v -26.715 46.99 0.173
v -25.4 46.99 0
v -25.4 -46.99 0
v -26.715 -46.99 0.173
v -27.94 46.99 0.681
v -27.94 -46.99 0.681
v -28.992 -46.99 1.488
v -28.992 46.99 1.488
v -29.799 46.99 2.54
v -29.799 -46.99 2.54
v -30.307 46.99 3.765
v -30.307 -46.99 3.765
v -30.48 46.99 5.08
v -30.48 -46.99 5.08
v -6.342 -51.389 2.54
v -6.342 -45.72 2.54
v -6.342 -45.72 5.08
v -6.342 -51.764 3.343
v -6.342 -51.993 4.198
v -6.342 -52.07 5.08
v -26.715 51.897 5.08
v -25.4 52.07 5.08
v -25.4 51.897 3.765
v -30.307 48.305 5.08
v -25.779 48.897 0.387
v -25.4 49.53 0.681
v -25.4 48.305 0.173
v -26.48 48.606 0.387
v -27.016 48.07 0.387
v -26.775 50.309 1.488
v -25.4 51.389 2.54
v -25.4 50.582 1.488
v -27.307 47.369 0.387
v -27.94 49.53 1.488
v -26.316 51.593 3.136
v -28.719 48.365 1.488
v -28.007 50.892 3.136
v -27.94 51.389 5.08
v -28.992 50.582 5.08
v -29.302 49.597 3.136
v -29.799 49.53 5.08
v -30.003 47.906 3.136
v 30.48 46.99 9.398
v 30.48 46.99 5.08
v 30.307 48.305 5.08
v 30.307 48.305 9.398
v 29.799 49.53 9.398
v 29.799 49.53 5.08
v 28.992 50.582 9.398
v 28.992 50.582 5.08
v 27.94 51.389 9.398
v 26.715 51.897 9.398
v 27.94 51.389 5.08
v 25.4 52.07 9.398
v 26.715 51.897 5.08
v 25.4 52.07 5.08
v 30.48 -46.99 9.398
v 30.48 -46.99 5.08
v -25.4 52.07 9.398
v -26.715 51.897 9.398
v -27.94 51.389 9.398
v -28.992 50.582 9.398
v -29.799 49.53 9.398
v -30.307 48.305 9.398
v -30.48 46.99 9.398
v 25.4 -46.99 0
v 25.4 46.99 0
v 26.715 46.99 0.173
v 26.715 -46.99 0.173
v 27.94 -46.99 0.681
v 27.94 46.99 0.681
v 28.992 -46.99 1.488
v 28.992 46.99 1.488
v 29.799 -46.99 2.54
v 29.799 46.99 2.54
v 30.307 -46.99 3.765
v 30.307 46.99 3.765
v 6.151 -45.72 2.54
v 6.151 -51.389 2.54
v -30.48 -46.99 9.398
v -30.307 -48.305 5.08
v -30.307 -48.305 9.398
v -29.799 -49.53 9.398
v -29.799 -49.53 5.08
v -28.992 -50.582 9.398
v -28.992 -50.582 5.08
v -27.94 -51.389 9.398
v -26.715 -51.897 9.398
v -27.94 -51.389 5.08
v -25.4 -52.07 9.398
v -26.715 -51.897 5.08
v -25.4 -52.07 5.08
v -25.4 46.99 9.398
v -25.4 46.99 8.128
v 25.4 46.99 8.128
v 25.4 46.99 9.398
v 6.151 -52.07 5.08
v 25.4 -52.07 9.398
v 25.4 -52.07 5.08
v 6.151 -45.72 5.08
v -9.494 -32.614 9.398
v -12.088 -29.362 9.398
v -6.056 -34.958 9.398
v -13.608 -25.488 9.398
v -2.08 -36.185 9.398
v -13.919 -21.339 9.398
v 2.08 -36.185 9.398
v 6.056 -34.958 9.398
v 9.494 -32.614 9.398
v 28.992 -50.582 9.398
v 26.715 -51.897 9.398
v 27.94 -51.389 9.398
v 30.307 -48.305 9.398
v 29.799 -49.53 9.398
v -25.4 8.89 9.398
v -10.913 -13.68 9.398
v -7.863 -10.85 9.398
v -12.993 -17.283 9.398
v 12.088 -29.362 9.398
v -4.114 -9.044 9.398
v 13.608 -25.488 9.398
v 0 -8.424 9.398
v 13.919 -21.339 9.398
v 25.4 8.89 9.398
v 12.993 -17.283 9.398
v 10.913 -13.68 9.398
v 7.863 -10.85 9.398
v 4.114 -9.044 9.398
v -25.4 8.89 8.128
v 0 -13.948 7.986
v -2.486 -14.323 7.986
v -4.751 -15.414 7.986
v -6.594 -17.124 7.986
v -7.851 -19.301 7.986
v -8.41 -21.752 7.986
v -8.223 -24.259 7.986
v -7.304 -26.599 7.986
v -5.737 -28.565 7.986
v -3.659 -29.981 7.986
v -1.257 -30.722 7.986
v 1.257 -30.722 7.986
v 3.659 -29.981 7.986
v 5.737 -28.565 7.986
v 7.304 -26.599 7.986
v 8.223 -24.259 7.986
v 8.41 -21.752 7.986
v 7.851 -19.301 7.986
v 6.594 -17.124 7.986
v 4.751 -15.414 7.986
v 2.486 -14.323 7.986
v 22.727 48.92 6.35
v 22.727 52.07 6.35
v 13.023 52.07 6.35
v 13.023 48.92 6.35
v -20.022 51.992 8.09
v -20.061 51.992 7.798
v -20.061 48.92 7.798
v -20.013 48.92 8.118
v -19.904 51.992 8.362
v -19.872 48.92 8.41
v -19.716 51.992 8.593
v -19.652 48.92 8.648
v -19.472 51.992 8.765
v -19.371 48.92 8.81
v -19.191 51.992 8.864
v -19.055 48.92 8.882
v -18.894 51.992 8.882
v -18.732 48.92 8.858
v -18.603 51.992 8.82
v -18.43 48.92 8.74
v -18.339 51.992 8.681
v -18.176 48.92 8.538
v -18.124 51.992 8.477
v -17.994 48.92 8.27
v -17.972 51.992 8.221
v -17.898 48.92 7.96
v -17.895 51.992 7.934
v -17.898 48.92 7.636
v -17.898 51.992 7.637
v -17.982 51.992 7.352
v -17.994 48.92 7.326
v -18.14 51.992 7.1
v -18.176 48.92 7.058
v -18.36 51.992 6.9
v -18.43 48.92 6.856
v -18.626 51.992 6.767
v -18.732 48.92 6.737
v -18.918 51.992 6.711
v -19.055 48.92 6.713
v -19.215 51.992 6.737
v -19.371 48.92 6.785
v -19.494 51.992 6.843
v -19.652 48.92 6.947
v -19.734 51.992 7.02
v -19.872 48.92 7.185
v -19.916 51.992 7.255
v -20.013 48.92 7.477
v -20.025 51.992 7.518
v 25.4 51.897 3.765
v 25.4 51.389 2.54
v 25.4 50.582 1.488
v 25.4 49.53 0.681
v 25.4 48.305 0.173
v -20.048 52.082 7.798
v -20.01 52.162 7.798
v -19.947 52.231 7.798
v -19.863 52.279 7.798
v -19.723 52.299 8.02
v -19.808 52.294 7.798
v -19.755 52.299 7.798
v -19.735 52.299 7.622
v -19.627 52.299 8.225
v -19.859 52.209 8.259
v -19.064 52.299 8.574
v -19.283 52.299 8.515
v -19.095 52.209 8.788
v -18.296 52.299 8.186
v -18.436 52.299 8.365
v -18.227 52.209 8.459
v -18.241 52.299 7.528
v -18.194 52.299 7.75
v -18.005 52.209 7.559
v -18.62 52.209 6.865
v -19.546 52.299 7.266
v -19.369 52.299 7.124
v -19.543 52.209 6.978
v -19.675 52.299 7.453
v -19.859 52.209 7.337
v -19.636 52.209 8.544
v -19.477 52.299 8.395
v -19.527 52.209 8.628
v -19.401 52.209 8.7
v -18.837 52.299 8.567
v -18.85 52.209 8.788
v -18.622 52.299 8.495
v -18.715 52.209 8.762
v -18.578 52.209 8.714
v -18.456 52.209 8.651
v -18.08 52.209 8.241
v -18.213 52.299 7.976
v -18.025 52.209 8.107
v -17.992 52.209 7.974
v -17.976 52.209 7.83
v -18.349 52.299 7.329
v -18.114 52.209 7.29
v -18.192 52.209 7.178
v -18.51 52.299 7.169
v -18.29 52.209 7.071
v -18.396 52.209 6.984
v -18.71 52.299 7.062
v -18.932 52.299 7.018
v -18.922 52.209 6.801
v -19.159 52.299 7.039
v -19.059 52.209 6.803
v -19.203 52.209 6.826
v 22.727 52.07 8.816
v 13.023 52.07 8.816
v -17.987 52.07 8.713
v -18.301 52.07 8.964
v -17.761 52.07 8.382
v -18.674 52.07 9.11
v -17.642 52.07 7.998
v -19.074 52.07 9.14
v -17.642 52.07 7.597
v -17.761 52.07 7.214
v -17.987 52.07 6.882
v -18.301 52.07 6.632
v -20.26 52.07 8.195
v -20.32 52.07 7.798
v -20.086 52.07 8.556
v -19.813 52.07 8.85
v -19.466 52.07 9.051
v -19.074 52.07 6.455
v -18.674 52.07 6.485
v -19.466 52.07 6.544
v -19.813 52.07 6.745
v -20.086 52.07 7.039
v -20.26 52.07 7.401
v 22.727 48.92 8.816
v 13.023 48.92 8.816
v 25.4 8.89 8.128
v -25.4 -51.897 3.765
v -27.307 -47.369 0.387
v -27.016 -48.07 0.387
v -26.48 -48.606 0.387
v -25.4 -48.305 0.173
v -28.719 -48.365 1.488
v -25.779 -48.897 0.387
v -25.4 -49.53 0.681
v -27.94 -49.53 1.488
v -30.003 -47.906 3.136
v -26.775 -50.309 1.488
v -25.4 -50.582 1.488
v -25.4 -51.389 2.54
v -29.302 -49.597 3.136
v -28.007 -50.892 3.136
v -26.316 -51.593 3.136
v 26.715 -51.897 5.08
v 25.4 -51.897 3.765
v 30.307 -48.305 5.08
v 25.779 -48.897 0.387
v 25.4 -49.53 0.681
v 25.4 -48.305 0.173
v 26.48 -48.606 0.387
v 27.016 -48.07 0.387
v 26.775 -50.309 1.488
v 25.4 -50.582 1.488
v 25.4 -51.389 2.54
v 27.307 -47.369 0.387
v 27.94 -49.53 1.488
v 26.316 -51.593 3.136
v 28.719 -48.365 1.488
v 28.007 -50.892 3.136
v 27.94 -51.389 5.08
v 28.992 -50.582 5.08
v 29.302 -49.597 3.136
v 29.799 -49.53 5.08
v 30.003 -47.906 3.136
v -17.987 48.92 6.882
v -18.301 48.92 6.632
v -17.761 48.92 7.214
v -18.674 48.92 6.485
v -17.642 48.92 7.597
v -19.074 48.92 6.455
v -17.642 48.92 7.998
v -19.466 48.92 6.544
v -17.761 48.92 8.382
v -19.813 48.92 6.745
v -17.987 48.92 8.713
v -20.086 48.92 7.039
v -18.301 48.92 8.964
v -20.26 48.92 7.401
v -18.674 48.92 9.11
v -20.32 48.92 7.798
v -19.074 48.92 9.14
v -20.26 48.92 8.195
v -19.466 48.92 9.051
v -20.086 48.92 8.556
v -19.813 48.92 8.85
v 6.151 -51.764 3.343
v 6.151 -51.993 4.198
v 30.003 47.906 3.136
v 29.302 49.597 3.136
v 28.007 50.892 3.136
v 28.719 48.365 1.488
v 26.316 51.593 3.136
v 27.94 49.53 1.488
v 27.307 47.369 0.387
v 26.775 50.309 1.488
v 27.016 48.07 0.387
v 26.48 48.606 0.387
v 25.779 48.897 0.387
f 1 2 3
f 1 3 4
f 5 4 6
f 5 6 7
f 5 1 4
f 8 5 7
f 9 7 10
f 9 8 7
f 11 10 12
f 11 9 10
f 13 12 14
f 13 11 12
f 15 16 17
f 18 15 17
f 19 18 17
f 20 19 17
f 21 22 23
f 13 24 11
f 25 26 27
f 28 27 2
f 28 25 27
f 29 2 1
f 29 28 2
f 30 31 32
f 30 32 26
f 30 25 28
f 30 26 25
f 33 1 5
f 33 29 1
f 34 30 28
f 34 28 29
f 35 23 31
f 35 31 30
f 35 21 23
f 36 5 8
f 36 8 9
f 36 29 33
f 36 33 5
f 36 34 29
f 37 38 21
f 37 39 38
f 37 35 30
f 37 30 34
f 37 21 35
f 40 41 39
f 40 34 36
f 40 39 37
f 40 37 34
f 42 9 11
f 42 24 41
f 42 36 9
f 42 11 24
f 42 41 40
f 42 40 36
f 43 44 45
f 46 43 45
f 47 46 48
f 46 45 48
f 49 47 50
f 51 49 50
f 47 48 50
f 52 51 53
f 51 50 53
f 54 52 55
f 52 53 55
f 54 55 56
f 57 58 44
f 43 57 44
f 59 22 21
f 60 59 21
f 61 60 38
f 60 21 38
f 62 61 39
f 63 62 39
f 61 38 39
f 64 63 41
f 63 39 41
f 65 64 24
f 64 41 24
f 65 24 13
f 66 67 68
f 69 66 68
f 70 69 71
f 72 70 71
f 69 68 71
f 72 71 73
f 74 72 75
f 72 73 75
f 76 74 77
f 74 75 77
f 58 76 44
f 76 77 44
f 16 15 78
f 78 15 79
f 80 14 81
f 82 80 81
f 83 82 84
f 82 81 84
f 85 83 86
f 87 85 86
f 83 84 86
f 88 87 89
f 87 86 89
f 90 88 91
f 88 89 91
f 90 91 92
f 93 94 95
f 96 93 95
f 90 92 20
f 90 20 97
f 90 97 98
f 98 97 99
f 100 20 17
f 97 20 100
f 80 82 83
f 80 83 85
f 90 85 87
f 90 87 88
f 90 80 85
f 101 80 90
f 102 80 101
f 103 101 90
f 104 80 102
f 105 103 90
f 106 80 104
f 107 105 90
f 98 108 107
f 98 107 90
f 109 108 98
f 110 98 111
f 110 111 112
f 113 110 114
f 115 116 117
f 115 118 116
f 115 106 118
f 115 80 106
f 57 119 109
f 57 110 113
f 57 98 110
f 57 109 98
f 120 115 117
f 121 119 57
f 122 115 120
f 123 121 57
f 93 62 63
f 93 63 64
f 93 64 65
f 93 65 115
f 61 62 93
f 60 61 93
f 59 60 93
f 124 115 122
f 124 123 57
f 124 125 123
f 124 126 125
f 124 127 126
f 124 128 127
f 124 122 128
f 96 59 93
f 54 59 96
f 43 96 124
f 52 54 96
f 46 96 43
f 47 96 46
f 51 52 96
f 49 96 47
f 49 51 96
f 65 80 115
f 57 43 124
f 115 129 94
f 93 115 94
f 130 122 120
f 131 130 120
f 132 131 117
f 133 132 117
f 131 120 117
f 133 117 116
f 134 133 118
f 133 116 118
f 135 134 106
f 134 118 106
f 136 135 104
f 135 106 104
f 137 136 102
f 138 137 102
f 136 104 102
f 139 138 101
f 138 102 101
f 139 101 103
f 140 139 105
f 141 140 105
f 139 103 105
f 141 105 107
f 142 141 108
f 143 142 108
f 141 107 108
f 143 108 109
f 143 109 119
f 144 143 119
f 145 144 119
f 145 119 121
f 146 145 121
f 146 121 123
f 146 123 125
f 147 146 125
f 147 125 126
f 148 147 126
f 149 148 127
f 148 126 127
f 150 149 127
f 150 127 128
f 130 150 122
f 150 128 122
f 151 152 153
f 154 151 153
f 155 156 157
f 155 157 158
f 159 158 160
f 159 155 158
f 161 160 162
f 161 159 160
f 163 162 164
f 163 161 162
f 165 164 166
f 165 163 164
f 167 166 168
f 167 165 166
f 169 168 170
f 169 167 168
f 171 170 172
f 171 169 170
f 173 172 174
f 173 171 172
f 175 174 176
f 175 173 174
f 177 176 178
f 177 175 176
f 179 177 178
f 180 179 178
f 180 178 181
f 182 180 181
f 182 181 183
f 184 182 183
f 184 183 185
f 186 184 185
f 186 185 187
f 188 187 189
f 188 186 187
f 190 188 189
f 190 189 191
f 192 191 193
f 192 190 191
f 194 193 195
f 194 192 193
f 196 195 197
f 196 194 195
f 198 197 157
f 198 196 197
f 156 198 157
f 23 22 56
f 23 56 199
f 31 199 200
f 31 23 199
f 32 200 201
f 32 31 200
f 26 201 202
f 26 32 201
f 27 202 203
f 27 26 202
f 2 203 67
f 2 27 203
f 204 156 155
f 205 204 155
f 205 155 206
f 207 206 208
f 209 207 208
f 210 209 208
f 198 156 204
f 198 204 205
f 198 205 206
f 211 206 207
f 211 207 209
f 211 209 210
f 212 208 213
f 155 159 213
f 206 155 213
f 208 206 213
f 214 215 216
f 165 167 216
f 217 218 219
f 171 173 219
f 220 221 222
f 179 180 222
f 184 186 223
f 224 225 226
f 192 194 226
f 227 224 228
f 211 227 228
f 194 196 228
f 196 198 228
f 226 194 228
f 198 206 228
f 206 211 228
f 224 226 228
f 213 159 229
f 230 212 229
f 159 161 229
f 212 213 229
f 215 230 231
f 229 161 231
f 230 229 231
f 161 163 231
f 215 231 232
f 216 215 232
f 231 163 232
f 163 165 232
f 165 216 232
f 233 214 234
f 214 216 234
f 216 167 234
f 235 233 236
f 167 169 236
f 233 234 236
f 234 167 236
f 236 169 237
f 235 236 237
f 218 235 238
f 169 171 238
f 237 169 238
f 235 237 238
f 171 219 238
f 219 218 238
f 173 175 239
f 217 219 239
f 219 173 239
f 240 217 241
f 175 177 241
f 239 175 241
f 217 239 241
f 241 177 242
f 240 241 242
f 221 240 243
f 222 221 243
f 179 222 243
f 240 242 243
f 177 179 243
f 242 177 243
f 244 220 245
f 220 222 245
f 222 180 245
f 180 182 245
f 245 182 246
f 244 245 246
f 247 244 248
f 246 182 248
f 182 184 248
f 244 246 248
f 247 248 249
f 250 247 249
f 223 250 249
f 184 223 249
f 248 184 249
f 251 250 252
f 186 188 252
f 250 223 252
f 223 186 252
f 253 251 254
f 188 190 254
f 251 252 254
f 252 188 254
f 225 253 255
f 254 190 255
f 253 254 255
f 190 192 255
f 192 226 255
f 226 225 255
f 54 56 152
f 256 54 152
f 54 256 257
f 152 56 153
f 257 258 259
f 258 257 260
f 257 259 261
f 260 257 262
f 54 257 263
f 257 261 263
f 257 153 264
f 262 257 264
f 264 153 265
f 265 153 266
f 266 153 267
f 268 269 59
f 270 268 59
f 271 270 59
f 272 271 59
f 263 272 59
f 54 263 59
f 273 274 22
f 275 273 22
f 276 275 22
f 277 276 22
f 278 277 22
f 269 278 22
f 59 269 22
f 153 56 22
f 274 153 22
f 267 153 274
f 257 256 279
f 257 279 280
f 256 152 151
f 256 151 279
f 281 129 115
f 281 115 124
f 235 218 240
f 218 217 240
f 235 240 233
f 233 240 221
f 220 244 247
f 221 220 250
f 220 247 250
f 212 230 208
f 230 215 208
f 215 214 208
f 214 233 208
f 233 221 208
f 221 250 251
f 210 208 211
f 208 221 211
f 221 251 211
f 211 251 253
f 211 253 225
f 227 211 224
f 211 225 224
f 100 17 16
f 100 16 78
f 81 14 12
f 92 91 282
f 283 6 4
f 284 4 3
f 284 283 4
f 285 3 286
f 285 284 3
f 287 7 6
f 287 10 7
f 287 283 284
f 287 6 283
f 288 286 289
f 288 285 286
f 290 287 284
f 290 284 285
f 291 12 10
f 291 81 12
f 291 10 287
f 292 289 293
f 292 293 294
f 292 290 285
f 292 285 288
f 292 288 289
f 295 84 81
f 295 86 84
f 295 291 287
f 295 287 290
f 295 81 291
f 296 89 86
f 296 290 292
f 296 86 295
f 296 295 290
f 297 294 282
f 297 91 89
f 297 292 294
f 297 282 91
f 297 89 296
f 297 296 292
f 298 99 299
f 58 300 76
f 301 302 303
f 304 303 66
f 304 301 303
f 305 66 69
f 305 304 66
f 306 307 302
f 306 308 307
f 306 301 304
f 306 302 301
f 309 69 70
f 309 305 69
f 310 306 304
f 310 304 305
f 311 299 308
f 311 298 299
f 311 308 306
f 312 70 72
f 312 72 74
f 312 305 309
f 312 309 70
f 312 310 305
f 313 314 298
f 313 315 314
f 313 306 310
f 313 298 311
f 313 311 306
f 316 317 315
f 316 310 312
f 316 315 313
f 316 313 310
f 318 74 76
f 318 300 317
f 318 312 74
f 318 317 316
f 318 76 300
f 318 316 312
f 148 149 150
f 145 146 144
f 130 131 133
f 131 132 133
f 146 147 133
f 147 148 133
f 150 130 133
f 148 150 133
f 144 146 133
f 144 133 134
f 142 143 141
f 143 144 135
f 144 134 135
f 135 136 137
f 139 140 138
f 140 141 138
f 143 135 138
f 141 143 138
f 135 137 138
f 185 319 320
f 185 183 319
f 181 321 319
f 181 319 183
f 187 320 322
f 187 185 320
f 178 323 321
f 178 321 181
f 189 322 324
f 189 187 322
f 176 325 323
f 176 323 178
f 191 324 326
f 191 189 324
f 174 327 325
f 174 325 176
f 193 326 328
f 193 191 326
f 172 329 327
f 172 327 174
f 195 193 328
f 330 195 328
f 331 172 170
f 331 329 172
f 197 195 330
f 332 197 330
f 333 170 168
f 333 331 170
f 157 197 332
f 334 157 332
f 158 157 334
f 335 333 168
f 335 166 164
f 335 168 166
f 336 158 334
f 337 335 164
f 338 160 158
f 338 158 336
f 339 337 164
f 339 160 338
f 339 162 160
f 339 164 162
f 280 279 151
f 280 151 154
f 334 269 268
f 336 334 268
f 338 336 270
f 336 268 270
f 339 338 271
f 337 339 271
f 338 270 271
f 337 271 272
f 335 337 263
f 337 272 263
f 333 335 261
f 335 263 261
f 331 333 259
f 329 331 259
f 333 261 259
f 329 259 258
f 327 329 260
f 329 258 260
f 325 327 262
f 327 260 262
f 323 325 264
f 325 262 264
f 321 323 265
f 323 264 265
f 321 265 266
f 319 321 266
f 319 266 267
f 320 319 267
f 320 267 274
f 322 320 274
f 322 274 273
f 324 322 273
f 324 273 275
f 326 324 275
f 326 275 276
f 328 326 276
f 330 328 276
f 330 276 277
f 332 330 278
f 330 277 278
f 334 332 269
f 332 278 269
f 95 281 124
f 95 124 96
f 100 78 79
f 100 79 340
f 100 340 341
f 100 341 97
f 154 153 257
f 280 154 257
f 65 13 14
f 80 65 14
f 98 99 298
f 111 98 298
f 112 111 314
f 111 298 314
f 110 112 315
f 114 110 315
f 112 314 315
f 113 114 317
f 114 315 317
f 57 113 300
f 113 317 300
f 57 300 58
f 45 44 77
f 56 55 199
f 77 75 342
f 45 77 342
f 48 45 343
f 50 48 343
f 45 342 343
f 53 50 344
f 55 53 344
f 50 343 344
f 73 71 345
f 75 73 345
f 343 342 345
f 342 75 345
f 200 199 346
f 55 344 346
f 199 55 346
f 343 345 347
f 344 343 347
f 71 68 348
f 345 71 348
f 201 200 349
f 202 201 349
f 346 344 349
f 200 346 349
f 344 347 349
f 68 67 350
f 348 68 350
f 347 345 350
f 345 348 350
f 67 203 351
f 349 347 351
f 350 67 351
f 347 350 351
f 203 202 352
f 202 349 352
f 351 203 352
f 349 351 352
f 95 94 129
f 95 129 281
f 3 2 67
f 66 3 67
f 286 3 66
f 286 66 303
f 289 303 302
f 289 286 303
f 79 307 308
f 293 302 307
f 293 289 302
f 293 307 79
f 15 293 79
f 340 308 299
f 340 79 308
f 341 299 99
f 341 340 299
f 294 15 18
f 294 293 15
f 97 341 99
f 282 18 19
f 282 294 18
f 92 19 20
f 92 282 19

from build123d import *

# Parameters (mm, degrees)
F0_R         = 17.78
F0_W         = 50.8
F0_H         = 38.1
F0_R_2       = 7.62
F1_DEPTH     = 9.398
F2_W         = 12.4930366991
F2_H         = 2.54
F3_DEPTH     = 6.35
F4_W         = 9.7033483908
F4_H         = 2.4660443887
F4_R         = 1.3462908927
F4_R_2       = 1.087736237
F5_DEPTH     = 3.1496
F6_DEPTH     = 0.2286
F7_R         = 0.3066051224
F8_T1_DEPTH  = 93.98
F8_T3_DEPTH  = 50.8
F8_T6_ANGLE  = 90
F8_T8_ANGLE  = 90
F8_T10_ANGLE = 90
F8_T12_ANGLE = 90
F9_START     = 8.128
F9_DEPTH     = 1.524


# Not quite as in the source:
# - a fillet or chamfer that OpenCascade refuses, or shapes differently, is made with other operations: its cross-section is extruded or revolved along the edge and cut away or added


with BuildPart() as f1:
    # F0 (on Top) → F1 (new body)
    with BuildSketch(Plane.XY):
        with BuildLine():
            Line((25.4, 52.07), (-25.4, 52.07))
            ThreePointArc((-25.4, 52.07), (-28.9921024484, 50.5821024484), (-30.48, 46.99))
            Line((-30.48, 46.99), (-30.48, -46.99))
            ThreePointArc((-30.48, -46.99), (-28.9921024484, -50.5821024484), (-25.4, -52.07))
            Line((-25.4, -52.07), (25.4, -52.07))
            ThreePointArc((25.4, -52.07), (28.9921024484, -50.5821024484), (30.48, -46.99))
            Line((30.48, -46.99), (30.48, 46.99))
            ThreePointArc((30.48, 46.99), (28.9921024484, 50.5821024484), (25.4, 52.07))
        make_face()
        with Locations((0, -21.59)):
            Circle(F0_R, mode=Mode.SUBTRACT)
        with Locations((0, 27.94)):
            Rectangle(F0_W, F0_H, mode=Mode.SUBTRACT)
        with Locations((0, -21.59)):
            Circle(F0_R)
        with Locations((0, -21.59)):
            Circle(F0_R_2, mode=Mode.SUBTRACT)
        with Locations((0, -21.59)):
            Circle(F0_R_2)
        with Locations((0, 27.94)):
            Rectangle(F0_W, F0_H)
    extrude(amount=F1_DEPTH)

    # F2 (on face) → F3 (cut)
    with BuildSketch(Plane.XZ.offset(52.07)):
        with Locations((-0.0956295989, 3.81)):
            Rectangle(F2_W, F2_H)
    extrude(amount=-F3_DEPTH, mode=Mode.SUBTRACT)

    # F4 (on face) → F5 (cut)
    with BuildSketch(Plane(origin=(0, 52.07, 0), x_dir=(-1, 0, 0), z_dir=(0, 1, 0))):
        with Locations((-17.8750143386, 7.5830221944)):
            Rectangle(F4_W, F4_H)
        with Locations((18.9737091073, 7.7977091073)):
            Circle(F4_R)
        with Locations((18.9737091073, 7.7977091073)):
            Circle(F4_R_2, mode=Mode.SUBTRACT)
    extrude(amount=-F5_DEPTH, mode=Mode.SUBTRACT)

    # F6 (add): a face of the model
    f6_faces = [f1.faces().sort_by_distance(p)[0] for p in [
        (-18.9737091073, 52.07, 7.7977091073),
    ]]
    extrude(f6_faces, amount=F6_DEPTH)

    # F7
    f7_edges = [f1.edges().sort_by_distance(p)[0] for p in [
        (-17.885973, 52.2986, 7.797709),
    ]]
    fillet(f7_edges, radius=F7_R)

    # F8: fillet of radius 5.08 on 1 edges, made by hand

    # F8_s2 → F8_t1 (cut)
    with BuildSketch(Plane.XZ.offset(-46.99)):
        with BuildLine():
            ThreePointArc((-25.4, 0), (-28.9921024484, 1.4878975516), (-30.48, 5.08))
            Line((-30.48, 5.08), (-30.48, 0))
            Line((-30.48, 0), (-25.4, 0))
        make_face()
        with BuildLine():
            ThreePointArc((25.4, 0), (28.9921024484, 1.4878975516), (30.48, 5.08))
            Line((30.48, 5.08), (30.48, 0))
            Line((30.48, 0), (25.4, 0))
        make_face()
    extrude(amount=F8_T1_DEPTH, mode=Mode.SUBTRACT)

    # F8_s4 → F8_t3 (cut)
    with BuildSketch(Plane.YZ.offset(-25.4)):
        with BuildLine():
            ThreePointArc((-46.99, 0), (-50.5821024484, 1.4878975516), (-52.07, 5.08))
            Line((-52.07, 5.08), (-52.07, 0))
            Line((-52.07, 0), (-46.99, 0))
        make_face()
        with BuildLine():
            ThreePointArc((52.07, 5.08), (50.5821024484, 1.4878975516), (46.99, 0))
            Line((46.99, 0), (52.07, 0))
            Line((52.07, 0), (52.07, 5.08))
        make_face()
    extrude(amount=F8_T3_DEPTH, mode=Mode.SUBTRACT)

    # F8_s5 → F8_t6 (revolve, cut)
    with BuildSketch(Plane.XZ.offset(46.99)):
        with BuildLine():
            ThreePointArc((-25.4, 0), (-28.9921024484, 1.4878975516), (-30.48, 5.08))
            Line((-30.48, 5.08), (-30.48, 0))
            Line((-30.48, 0), (-25.4, 0))
        make_face()
    revolve(axis=Axis((-25.4, -46.99, 0), (0, 0, 1)), revolution_arc=F8_T6_ANGLE, mode=Mode.SUBTRACT)

    # F8_s7 → F8_t8 (revolve, cut)
    with BuildSketch(Plane.YZ.offset(25.4)):
        with BuildLine():
            ThreePointArc((-46.99, 0), (-50.5821024484, 1.4878975516), (-52.07, 5.08))
            Line((-52.07, 5.08), (-52.07, 0))
            Line((-52.07, 0), (-46.99, 0))
        make_face()
    revolve(axis=Axis((25.4, -46.99, 0), (0, 0, 1)), revolution_arc=F8_T8_ANGLE, mode=Mode.SUBTRACT)

    # F8_s9 → F8_t10 (revolve, cut)
    with BuildSketch(Plane.XZ.offset(-46.99)):
        with BuildLine():
            ThreePointArc((30.48, 5.08), (28.9921024484, 1.4878975516), (25.4, 0))
            Line((25.4, 0), (30.48, 0))
            Line((30.48, 0), (30.48, 5.08))
        make_face()
    revolve(axis=Axis((25.4, 46.99, 0), (0, 0, 1)), revolution_arc=F8_T10_ANGLE, mode=Mode.SUBTRACT)

    # F8_s11 → F8_t12 (revolve, cut)
    with BuildSketch(Plane.YZ.offset(-25.4)):
        with BuildLine():
            ThreePointArc((46.99, 0), (50.5821024484, 1.4878975516), (52.07, 5.08))
            Line((52.07, 5.08), (52.07, 0))
            Line((52.07, 0), (46.99, 0))
        make_face()
    revolve(axis=Axis((-25.4, 46.99, 0), (0, 0, 1)), revolution_arc=F8_T12_ANGLE, mode=Mode.SUBTRACT)

    # F0 (on Top) → F9 (cut)
    with BuildSketch(Plane.XY.offset(F9_START)):
        with Locations((0, 27.94)):
            Rectangle(F0_W, F0_H)
    extrude(amount=F9_DEPTH, mode=Mode.SUBTRACT)

    # F10 (on Right) → F11 (revolve, cut)
    with BuildSketch(Plane.YZ):
        Polygon((-7.623700425, 9.6026211977), (-22.3824381828, 9.6026211977), (-22.3824381828, 7.986061275), (-13.9484070241, 7.986061275), align=None)
    revolve(axis=Axis((0, -22.3824381828, 9.8022762686), (0, 0, 1)), mode=Mode.SUBTRACT)


solid = f1.part
